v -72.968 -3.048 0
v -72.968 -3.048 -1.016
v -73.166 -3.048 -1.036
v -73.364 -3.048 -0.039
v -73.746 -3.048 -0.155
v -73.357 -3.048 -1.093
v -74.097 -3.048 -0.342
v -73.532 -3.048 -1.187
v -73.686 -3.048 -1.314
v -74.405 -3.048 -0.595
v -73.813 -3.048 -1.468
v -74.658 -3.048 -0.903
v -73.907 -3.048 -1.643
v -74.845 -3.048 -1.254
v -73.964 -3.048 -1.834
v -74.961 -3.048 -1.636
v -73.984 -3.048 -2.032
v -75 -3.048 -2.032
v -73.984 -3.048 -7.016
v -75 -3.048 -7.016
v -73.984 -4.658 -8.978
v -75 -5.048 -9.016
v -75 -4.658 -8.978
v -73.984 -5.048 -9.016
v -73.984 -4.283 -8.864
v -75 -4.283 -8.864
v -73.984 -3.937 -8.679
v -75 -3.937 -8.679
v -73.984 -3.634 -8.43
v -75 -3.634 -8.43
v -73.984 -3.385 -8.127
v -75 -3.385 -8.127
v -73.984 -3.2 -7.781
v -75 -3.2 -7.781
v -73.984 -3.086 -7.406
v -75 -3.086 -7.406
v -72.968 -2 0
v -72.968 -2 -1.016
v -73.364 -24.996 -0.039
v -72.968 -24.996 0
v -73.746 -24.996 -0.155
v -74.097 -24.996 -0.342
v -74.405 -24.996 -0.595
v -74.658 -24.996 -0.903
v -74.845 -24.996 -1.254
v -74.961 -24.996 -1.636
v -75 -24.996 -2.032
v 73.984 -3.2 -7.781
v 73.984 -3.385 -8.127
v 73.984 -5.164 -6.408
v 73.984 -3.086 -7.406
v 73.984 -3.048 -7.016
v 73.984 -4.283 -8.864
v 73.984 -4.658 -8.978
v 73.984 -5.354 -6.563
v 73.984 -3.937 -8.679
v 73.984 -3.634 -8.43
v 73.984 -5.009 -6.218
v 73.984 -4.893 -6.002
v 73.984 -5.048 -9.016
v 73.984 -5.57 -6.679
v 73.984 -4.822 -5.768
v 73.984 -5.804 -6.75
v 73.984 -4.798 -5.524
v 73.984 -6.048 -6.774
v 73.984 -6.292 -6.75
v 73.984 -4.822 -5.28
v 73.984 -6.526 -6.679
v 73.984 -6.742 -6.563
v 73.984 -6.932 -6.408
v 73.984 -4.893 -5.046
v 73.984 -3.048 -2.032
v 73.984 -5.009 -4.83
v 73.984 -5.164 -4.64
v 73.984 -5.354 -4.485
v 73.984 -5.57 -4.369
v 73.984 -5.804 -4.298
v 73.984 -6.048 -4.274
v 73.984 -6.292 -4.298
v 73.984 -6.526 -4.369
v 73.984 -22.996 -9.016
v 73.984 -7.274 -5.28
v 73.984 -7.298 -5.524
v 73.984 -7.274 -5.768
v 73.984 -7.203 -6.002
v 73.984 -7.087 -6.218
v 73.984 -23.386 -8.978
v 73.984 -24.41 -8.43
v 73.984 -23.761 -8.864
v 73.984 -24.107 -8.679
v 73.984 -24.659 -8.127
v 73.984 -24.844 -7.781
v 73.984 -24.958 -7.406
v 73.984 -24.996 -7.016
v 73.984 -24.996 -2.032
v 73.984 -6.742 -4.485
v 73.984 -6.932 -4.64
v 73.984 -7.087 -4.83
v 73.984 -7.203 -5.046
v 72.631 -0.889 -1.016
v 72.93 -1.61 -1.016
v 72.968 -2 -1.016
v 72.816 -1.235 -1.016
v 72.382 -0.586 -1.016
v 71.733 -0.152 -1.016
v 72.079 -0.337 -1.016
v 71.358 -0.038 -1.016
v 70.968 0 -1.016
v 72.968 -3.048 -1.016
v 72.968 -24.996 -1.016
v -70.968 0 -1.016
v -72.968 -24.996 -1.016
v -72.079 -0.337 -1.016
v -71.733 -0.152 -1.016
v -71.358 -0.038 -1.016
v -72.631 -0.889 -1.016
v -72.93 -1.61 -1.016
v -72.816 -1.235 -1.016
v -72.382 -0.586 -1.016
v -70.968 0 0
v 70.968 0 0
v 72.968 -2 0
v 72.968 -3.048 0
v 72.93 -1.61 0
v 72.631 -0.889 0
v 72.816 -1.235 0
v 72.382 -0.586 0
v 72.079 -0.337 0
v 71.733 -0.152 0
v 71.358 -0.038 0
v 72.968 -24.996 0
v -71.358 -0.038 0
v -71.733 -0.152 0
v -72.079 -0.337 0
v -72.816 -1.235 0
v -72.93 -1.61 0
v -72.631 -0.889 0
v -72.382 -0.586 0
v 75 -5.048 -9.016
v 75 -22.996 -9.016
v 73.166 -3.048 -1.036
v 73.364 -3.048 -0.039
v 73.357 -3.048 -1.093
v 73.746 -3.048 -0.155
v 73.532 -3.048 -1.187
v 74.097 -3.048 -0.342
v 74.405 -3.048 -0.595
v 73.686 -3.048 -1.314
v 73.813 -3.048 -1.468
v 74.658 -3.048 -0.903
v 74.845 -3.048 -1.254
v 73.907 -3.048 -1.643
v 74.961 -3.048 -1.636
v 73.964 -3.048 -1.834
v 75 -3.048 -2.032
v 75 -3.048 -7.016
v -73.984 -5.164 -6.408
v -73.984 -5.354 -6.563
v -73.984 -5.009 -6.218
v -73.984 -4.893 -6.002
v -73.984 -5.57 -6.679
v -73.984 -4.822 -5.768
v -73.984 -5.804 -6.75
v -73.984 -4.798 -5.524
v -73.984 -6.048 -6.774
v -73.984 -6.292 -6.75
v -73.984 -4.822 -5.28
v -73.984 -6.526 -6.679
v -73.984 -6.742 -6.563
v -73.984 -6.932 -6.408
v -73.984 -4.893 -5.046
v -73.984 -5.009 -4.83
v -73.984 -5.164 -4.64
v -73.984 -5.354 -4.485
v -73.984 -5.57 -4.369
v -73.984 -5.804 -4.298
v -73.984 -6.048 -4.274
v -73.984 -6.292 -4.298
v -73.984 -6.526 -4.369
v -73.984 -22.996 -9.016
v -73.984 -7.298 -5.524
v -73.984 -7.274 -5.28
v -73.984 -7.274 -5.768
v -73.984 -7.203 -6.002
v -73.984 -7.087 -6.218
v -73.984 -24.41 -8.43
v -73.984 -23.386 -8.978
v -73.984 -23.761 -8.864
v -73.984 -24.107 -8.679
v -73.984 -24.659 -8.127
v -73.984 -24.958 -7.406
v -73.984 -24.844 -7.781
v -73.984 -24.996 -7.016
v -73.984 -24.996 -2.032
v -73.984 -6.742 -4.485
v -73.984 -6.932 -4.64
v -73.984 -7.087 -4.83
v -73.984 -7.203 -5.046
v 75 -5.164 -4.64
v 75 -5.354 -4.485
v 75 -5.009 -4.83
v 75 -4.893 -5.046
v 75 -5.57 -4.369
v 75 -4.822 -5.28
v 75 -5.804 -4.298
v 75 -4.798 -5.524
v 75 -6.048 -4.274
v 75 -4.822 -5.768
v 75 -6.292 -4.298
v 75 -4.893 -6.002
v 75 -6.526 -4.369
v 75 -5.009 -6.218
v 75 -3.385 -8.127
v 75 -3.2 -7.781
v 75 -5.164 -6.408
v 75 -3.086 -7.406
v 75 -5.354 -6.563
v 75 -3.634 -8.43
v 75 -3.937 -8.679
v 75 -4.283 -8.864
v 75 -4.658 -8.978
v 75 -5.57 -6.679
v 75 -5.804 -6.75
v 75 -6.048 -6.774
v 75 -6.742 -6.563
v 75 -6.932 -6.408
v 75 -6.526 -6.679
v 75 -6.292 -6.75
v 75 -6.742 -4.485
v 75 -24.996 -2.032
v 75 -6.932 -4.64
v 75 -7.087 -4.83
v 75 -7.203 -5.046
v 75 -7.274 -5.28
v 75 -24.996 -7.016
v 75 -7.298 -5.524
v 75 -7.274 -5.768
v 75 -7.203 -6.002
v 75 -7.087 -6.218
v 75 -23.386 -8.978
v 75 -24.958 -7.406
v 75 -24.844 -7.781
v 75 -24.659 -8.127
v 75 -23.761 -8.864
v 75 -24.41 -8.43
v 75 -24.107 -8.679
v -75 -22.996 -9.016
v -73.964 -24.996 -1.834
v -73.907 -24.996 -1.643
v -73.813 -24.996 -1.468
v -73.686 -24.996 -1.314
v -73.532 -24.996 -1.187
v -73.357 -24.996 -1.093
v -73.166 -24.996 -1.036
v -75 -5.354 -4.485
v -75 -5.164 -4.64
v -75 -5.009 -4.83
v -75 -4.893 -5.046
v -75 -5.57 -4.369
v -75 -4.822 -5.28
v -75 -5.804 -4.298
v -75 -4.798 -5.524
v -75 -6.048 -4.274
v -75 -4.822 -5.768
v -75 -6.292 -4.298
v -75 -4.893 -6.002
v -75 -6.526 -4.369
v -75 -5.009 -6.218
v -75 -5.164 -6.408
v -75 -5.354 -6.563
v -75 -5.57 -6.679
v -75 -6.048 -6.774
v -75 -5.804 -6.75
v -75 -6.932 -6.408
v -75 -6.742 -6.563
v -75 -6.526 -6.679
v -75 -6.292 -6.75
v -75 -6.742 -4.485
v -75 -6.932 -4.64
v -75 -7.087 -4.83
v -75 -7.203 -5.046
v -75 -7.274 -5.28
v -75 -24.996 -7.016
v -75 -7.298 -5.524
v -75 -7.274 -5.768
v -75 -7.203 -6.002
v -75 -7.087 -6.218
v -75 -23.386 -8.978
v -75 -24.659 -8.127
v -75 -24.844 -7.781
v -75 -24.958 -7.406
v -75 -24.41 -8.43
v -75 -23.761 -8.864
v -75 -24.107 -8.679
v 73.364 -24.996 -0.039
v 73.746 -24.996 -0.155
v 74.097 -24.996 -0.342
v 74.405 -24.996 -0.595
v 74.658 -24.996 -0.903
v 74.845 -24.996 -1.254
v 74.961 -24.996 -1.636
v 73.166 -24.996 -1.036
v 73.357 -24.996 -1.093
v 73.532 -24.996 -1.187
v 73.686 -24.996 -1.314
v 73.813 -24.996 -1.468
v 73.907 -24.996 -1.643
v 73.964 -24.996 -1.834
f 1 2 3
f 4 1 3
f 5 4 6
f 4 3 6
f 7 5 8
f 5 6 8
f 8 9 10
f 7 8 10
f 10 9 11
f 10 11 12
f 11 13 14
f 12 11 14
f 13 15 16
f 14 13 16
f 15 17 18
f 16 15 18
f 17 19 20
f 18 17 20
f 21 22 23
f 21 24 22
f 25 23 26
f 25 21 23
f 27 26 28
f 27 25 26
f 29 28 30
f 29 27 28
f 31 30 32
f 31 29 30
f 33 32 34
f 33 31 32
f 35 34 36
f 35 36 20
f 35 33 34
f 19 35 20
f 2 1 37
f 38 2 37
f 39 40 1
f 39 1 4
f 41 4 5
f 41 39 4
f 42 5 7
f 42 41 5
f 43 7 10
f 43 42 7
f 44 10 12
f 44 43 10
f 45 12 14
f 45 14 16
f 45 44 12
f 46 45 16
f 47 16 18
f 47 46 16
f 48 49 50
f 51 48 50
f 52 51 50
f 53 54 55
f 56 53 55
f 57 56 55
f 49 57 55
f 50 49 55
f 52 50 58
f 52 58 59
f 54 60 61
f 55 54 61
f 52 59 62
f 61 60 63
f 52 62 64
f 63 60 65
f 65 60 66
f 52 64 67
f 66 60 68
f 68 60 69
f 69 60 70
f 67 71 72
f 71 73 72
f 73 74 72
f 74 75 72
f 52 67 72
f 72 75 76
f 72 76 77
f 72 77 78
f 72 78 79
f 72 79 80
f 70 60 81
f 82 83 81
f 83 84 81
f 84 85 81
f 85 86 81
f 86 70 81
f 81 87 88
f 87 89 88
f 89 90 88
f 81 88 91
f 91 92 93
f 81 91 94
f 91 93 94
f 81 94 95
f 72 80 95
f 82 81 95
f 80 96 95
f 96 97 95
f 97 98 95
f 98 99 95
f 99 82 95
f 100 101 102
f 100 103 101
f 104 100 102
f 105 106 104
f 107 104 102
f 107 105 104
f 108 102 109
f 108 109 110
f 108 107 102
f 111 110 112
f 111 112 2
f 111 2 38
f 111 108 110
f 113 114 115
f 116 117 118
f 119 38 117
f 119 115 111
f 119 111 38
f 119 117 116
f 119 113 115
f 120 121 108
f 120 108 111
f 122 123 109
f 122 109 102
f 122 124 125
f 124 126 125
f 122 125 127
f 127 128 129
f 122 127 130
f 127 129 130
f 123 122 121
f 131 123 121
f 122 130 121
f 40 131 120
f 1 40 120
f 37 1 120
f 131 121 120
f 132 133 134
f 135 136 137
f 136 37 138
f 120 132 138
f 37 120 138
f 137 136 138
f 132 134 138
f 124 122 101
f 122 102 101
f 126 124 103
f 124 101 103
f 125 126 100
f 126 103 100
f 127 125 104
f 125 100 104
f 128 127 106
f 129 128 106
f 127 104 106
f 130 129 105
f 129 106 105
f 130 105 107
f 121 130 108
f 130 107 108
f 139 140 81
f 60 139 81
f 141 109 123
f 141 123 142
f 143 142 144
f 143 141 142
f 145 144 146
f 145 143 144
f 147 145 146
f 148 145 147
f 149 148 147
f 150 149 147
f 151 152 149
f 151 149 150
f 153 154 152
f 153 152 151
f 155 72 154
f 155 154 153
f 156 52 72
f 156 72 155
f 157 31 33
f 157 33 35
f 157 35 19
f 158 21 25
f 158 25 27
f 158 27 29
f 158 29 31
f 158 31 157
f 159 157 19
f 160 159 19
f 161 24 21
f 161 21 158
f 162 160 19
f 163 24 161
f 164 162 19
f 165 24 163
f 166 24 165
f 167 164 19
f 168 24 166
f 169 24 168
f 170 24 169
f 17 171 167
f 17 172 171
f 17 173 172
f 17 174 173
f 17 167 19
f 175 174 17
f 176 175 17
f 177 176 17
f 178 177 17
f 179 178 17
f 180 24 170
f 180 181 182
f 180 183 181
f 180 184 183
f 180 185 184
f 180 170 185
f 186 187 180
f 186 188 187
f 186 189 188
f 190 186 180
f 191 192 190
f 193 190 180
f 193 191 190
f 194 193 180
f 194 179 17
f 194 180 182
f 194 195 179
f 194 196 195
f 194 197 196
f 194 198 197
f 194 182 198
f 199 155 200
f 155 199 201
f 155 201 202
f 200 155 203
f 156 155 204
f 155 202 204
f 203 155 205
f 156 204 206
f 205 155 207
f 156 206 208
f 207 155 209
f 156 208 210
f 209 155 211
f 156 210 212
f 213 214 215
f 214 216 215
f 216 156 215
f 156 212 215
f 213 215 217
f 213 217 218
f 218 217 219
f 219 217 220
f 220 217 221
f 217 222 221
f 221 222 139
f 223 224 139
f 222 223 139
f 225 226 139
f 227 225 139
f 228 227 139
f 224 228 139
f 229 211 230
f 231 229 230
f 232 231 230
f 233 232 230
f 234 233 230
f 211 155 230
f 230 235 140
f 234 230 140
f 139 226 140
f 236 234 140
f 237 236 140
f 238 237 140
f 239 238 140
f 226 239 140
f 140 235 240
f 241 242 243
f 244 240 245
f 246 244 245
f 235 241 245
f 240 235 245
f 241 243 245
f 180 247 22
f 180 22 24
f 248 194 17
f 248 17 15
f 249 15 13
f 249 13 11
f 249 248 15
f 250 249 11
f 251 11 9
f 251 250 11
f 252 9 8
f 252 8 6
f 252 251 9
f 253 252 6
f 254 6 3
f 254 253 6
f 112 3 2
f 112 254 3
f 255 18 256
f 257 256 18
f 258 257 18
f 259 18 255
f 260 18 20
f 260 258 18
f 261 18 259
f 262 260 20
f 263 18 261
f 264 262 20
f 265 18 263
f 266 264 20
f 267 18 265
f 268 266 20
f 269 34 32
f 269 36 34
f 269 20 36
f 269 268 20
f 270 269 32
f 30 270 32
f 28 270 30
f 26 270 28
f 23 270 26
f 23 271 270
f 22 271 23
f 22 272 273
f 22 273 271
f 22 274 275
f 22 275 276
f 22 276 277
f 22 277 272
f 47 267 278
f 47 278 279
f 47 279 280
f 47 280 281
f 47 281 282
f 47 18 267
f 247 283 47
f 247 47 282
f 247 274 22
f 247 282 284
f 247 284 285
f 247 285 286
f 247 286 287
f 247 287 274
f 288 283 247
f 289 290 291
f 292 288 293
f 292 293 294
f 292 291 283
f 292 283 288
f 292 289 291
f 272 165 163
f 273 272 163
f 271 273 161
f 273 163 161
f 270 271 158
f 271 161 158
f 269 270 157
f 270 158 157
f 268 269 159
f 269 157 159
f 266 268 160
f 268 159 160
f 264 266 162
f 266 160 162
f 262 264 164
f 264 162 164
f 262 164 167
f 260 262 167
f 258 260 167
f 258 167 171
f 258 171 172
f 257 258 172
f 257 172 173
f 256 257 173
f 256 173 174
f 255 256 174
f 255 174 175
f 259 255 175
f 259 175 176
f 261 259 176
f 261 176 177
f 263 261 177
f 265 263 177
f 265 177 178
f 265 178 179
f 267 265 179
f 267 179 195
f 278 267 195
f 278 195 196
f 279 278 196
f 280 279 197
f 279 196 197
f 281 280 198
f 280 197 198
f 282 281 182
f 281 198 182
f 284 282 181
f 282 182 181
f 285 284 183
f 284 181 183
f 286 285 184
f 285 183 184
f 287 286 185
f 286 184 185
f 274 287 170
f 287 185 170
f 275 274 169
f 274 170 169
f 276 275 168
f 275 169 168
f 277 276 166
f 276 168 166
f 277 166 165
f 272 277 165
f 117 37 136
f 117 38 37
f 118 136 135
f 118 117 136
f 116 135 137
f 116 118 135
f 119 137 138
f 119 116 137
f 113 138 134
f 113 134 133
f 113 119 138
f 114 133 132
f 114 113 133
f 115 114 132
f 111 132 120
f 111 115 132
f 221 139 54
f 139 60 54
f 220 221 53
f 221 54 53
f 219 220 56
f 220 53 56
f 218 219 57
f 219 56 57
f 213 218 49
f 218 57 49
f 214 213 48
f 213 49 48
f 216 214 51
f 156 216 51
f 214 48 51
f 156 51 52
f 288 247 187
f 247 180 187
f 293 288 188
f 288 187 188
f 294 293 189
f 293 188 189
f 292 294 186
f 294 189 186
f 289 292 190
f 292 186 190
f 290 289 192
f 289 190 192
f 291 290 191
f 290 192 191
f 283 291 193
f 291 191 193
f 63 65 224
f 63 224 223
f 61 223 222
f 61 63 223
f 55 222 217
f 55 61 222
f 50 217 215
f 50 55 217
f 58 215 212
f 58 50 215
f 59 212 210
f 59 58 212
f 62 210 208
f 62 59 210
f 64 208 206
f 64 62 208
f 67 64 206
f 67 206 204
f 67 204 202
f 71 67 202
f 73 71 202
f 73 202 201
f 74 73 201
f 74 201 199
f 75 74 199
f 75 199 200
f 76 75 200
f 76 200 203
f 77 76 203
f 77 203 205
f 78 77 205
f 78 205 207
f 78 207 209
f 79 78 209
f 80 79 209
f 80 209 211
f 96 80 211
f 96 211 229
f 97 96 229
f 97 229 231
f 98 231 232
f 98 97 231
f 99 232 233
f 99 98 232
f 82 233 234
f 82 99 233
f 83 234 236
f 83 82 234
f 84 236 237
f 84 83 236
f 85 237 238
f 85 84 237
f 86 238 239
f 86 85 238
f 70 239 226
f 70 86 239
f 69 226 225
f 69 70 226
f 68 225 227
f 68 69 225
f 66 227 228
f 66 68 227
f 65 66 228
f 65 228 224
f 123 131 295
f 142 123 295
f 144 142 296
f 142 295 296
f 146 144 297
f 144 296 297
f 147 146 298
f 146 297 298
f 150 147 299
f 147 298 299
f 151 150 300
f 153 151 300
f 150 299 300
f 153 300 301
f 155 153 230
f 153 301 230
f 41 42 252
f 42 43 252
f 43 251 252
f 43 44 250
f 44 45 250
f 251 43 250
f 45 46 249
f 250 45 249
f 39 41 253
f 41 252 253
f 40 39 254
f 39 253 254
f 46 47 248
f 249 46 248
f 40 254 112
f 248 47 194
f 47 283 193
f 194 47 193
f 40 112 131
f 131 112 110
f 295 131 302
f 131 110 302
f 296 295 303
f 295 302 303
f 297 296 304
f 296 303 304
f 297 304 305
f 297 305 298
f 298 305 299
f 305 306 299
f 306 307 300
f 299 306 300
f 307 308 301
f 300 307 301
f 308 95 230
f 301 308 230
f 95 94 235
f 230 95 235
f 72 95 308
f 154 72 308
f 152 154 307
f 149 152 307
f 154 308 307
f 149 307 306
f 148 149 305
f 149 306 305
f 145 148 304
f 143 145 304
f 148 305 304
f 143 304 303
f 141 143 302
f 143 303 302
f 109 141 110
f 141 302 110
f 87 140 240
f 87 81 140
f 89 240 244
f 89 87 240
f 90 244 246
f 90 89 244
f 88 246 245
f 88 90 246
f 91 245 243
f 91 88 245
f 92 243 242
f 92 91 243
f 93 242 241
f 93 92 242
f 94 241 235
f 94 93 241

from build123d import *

# Parameters (mm, degrees)
SKETCH2_W                   = 72.968
SKETCH2_H                   = 24.996
BASE_FLANGE1_DEPTH          = 1.016
EDGE_FLANGE1_DEPTH          = 21.948
FILLET1_R                   = 2
TAP_DRILL_FOR_M3X0_5_TAP1_D = 2.5


# Sheet-metal steps are written as plain solids
with BuildPart() as part:
    # Sketch2 → Base-Flange1 (new body)
    with BuildSketch(Plane.XY):
        with Locations((-36.484, -12.498)):
            Rectangle(SKETCH2_W, SKETCH2_H)
    extrude(amount=-BASE_FLANGE1_DEPTH)

    # Edge-Flange1 section (across the edge) → Edge-Flange1 (add)
    with BuildSketch(Plane(origin=(-73.984, -24.996, -1.016), x_dir=(1, 0, 0), z_dir=(0, 1, 0))):
        with BuildLine():
            Line((-1.016, 1.016), (-1.016, 8))
            Line((-1.016, 8), (0, 8))
            Line((0, 8), (0, 1.016))
            ThreePointArc((0, 1.016), (0.29757951, 0.29757951), (1.016, 0))
            Line((1.016, 0), (1.016, -1.016))
            ThreePointArc((1.016, -1.016), (-0.420840979, -0.420840979), (-1.016, 1.016))
        make_face()
    extrude(amount=EDGE_FLANGE1_DEPTH)

    # Fillet1
    fillet1_edges = [part.edges().sort_by_distance(p)[0] for p in [
        (-74.492, -24.996, -9.016),
        (-74.492, -3.048, -9.016),
        (-72.968, 0, -0.508),
    ]]
    fillet(fillet1_edges, radius=FILLET1_R)

    # Tap Drill for M3x0.5 Tap1 (through all)
    with Locations(Plane.ZY.offset(75)):
        with Locations((-5.524, -6.048)):
            Hole(TAP_DRILL_FOR_M3X0_5_TAP1_D / 2)

    # Mirror1: part across plane


with BuildPart() as part_1:
    add(part.part)
    add(part.part.mirror(Plane(origin=(0, -24.996, -1.016), x_dir=(0, 0, 1), z_dir=(1, 0, 0))))


solid = part_1.part
